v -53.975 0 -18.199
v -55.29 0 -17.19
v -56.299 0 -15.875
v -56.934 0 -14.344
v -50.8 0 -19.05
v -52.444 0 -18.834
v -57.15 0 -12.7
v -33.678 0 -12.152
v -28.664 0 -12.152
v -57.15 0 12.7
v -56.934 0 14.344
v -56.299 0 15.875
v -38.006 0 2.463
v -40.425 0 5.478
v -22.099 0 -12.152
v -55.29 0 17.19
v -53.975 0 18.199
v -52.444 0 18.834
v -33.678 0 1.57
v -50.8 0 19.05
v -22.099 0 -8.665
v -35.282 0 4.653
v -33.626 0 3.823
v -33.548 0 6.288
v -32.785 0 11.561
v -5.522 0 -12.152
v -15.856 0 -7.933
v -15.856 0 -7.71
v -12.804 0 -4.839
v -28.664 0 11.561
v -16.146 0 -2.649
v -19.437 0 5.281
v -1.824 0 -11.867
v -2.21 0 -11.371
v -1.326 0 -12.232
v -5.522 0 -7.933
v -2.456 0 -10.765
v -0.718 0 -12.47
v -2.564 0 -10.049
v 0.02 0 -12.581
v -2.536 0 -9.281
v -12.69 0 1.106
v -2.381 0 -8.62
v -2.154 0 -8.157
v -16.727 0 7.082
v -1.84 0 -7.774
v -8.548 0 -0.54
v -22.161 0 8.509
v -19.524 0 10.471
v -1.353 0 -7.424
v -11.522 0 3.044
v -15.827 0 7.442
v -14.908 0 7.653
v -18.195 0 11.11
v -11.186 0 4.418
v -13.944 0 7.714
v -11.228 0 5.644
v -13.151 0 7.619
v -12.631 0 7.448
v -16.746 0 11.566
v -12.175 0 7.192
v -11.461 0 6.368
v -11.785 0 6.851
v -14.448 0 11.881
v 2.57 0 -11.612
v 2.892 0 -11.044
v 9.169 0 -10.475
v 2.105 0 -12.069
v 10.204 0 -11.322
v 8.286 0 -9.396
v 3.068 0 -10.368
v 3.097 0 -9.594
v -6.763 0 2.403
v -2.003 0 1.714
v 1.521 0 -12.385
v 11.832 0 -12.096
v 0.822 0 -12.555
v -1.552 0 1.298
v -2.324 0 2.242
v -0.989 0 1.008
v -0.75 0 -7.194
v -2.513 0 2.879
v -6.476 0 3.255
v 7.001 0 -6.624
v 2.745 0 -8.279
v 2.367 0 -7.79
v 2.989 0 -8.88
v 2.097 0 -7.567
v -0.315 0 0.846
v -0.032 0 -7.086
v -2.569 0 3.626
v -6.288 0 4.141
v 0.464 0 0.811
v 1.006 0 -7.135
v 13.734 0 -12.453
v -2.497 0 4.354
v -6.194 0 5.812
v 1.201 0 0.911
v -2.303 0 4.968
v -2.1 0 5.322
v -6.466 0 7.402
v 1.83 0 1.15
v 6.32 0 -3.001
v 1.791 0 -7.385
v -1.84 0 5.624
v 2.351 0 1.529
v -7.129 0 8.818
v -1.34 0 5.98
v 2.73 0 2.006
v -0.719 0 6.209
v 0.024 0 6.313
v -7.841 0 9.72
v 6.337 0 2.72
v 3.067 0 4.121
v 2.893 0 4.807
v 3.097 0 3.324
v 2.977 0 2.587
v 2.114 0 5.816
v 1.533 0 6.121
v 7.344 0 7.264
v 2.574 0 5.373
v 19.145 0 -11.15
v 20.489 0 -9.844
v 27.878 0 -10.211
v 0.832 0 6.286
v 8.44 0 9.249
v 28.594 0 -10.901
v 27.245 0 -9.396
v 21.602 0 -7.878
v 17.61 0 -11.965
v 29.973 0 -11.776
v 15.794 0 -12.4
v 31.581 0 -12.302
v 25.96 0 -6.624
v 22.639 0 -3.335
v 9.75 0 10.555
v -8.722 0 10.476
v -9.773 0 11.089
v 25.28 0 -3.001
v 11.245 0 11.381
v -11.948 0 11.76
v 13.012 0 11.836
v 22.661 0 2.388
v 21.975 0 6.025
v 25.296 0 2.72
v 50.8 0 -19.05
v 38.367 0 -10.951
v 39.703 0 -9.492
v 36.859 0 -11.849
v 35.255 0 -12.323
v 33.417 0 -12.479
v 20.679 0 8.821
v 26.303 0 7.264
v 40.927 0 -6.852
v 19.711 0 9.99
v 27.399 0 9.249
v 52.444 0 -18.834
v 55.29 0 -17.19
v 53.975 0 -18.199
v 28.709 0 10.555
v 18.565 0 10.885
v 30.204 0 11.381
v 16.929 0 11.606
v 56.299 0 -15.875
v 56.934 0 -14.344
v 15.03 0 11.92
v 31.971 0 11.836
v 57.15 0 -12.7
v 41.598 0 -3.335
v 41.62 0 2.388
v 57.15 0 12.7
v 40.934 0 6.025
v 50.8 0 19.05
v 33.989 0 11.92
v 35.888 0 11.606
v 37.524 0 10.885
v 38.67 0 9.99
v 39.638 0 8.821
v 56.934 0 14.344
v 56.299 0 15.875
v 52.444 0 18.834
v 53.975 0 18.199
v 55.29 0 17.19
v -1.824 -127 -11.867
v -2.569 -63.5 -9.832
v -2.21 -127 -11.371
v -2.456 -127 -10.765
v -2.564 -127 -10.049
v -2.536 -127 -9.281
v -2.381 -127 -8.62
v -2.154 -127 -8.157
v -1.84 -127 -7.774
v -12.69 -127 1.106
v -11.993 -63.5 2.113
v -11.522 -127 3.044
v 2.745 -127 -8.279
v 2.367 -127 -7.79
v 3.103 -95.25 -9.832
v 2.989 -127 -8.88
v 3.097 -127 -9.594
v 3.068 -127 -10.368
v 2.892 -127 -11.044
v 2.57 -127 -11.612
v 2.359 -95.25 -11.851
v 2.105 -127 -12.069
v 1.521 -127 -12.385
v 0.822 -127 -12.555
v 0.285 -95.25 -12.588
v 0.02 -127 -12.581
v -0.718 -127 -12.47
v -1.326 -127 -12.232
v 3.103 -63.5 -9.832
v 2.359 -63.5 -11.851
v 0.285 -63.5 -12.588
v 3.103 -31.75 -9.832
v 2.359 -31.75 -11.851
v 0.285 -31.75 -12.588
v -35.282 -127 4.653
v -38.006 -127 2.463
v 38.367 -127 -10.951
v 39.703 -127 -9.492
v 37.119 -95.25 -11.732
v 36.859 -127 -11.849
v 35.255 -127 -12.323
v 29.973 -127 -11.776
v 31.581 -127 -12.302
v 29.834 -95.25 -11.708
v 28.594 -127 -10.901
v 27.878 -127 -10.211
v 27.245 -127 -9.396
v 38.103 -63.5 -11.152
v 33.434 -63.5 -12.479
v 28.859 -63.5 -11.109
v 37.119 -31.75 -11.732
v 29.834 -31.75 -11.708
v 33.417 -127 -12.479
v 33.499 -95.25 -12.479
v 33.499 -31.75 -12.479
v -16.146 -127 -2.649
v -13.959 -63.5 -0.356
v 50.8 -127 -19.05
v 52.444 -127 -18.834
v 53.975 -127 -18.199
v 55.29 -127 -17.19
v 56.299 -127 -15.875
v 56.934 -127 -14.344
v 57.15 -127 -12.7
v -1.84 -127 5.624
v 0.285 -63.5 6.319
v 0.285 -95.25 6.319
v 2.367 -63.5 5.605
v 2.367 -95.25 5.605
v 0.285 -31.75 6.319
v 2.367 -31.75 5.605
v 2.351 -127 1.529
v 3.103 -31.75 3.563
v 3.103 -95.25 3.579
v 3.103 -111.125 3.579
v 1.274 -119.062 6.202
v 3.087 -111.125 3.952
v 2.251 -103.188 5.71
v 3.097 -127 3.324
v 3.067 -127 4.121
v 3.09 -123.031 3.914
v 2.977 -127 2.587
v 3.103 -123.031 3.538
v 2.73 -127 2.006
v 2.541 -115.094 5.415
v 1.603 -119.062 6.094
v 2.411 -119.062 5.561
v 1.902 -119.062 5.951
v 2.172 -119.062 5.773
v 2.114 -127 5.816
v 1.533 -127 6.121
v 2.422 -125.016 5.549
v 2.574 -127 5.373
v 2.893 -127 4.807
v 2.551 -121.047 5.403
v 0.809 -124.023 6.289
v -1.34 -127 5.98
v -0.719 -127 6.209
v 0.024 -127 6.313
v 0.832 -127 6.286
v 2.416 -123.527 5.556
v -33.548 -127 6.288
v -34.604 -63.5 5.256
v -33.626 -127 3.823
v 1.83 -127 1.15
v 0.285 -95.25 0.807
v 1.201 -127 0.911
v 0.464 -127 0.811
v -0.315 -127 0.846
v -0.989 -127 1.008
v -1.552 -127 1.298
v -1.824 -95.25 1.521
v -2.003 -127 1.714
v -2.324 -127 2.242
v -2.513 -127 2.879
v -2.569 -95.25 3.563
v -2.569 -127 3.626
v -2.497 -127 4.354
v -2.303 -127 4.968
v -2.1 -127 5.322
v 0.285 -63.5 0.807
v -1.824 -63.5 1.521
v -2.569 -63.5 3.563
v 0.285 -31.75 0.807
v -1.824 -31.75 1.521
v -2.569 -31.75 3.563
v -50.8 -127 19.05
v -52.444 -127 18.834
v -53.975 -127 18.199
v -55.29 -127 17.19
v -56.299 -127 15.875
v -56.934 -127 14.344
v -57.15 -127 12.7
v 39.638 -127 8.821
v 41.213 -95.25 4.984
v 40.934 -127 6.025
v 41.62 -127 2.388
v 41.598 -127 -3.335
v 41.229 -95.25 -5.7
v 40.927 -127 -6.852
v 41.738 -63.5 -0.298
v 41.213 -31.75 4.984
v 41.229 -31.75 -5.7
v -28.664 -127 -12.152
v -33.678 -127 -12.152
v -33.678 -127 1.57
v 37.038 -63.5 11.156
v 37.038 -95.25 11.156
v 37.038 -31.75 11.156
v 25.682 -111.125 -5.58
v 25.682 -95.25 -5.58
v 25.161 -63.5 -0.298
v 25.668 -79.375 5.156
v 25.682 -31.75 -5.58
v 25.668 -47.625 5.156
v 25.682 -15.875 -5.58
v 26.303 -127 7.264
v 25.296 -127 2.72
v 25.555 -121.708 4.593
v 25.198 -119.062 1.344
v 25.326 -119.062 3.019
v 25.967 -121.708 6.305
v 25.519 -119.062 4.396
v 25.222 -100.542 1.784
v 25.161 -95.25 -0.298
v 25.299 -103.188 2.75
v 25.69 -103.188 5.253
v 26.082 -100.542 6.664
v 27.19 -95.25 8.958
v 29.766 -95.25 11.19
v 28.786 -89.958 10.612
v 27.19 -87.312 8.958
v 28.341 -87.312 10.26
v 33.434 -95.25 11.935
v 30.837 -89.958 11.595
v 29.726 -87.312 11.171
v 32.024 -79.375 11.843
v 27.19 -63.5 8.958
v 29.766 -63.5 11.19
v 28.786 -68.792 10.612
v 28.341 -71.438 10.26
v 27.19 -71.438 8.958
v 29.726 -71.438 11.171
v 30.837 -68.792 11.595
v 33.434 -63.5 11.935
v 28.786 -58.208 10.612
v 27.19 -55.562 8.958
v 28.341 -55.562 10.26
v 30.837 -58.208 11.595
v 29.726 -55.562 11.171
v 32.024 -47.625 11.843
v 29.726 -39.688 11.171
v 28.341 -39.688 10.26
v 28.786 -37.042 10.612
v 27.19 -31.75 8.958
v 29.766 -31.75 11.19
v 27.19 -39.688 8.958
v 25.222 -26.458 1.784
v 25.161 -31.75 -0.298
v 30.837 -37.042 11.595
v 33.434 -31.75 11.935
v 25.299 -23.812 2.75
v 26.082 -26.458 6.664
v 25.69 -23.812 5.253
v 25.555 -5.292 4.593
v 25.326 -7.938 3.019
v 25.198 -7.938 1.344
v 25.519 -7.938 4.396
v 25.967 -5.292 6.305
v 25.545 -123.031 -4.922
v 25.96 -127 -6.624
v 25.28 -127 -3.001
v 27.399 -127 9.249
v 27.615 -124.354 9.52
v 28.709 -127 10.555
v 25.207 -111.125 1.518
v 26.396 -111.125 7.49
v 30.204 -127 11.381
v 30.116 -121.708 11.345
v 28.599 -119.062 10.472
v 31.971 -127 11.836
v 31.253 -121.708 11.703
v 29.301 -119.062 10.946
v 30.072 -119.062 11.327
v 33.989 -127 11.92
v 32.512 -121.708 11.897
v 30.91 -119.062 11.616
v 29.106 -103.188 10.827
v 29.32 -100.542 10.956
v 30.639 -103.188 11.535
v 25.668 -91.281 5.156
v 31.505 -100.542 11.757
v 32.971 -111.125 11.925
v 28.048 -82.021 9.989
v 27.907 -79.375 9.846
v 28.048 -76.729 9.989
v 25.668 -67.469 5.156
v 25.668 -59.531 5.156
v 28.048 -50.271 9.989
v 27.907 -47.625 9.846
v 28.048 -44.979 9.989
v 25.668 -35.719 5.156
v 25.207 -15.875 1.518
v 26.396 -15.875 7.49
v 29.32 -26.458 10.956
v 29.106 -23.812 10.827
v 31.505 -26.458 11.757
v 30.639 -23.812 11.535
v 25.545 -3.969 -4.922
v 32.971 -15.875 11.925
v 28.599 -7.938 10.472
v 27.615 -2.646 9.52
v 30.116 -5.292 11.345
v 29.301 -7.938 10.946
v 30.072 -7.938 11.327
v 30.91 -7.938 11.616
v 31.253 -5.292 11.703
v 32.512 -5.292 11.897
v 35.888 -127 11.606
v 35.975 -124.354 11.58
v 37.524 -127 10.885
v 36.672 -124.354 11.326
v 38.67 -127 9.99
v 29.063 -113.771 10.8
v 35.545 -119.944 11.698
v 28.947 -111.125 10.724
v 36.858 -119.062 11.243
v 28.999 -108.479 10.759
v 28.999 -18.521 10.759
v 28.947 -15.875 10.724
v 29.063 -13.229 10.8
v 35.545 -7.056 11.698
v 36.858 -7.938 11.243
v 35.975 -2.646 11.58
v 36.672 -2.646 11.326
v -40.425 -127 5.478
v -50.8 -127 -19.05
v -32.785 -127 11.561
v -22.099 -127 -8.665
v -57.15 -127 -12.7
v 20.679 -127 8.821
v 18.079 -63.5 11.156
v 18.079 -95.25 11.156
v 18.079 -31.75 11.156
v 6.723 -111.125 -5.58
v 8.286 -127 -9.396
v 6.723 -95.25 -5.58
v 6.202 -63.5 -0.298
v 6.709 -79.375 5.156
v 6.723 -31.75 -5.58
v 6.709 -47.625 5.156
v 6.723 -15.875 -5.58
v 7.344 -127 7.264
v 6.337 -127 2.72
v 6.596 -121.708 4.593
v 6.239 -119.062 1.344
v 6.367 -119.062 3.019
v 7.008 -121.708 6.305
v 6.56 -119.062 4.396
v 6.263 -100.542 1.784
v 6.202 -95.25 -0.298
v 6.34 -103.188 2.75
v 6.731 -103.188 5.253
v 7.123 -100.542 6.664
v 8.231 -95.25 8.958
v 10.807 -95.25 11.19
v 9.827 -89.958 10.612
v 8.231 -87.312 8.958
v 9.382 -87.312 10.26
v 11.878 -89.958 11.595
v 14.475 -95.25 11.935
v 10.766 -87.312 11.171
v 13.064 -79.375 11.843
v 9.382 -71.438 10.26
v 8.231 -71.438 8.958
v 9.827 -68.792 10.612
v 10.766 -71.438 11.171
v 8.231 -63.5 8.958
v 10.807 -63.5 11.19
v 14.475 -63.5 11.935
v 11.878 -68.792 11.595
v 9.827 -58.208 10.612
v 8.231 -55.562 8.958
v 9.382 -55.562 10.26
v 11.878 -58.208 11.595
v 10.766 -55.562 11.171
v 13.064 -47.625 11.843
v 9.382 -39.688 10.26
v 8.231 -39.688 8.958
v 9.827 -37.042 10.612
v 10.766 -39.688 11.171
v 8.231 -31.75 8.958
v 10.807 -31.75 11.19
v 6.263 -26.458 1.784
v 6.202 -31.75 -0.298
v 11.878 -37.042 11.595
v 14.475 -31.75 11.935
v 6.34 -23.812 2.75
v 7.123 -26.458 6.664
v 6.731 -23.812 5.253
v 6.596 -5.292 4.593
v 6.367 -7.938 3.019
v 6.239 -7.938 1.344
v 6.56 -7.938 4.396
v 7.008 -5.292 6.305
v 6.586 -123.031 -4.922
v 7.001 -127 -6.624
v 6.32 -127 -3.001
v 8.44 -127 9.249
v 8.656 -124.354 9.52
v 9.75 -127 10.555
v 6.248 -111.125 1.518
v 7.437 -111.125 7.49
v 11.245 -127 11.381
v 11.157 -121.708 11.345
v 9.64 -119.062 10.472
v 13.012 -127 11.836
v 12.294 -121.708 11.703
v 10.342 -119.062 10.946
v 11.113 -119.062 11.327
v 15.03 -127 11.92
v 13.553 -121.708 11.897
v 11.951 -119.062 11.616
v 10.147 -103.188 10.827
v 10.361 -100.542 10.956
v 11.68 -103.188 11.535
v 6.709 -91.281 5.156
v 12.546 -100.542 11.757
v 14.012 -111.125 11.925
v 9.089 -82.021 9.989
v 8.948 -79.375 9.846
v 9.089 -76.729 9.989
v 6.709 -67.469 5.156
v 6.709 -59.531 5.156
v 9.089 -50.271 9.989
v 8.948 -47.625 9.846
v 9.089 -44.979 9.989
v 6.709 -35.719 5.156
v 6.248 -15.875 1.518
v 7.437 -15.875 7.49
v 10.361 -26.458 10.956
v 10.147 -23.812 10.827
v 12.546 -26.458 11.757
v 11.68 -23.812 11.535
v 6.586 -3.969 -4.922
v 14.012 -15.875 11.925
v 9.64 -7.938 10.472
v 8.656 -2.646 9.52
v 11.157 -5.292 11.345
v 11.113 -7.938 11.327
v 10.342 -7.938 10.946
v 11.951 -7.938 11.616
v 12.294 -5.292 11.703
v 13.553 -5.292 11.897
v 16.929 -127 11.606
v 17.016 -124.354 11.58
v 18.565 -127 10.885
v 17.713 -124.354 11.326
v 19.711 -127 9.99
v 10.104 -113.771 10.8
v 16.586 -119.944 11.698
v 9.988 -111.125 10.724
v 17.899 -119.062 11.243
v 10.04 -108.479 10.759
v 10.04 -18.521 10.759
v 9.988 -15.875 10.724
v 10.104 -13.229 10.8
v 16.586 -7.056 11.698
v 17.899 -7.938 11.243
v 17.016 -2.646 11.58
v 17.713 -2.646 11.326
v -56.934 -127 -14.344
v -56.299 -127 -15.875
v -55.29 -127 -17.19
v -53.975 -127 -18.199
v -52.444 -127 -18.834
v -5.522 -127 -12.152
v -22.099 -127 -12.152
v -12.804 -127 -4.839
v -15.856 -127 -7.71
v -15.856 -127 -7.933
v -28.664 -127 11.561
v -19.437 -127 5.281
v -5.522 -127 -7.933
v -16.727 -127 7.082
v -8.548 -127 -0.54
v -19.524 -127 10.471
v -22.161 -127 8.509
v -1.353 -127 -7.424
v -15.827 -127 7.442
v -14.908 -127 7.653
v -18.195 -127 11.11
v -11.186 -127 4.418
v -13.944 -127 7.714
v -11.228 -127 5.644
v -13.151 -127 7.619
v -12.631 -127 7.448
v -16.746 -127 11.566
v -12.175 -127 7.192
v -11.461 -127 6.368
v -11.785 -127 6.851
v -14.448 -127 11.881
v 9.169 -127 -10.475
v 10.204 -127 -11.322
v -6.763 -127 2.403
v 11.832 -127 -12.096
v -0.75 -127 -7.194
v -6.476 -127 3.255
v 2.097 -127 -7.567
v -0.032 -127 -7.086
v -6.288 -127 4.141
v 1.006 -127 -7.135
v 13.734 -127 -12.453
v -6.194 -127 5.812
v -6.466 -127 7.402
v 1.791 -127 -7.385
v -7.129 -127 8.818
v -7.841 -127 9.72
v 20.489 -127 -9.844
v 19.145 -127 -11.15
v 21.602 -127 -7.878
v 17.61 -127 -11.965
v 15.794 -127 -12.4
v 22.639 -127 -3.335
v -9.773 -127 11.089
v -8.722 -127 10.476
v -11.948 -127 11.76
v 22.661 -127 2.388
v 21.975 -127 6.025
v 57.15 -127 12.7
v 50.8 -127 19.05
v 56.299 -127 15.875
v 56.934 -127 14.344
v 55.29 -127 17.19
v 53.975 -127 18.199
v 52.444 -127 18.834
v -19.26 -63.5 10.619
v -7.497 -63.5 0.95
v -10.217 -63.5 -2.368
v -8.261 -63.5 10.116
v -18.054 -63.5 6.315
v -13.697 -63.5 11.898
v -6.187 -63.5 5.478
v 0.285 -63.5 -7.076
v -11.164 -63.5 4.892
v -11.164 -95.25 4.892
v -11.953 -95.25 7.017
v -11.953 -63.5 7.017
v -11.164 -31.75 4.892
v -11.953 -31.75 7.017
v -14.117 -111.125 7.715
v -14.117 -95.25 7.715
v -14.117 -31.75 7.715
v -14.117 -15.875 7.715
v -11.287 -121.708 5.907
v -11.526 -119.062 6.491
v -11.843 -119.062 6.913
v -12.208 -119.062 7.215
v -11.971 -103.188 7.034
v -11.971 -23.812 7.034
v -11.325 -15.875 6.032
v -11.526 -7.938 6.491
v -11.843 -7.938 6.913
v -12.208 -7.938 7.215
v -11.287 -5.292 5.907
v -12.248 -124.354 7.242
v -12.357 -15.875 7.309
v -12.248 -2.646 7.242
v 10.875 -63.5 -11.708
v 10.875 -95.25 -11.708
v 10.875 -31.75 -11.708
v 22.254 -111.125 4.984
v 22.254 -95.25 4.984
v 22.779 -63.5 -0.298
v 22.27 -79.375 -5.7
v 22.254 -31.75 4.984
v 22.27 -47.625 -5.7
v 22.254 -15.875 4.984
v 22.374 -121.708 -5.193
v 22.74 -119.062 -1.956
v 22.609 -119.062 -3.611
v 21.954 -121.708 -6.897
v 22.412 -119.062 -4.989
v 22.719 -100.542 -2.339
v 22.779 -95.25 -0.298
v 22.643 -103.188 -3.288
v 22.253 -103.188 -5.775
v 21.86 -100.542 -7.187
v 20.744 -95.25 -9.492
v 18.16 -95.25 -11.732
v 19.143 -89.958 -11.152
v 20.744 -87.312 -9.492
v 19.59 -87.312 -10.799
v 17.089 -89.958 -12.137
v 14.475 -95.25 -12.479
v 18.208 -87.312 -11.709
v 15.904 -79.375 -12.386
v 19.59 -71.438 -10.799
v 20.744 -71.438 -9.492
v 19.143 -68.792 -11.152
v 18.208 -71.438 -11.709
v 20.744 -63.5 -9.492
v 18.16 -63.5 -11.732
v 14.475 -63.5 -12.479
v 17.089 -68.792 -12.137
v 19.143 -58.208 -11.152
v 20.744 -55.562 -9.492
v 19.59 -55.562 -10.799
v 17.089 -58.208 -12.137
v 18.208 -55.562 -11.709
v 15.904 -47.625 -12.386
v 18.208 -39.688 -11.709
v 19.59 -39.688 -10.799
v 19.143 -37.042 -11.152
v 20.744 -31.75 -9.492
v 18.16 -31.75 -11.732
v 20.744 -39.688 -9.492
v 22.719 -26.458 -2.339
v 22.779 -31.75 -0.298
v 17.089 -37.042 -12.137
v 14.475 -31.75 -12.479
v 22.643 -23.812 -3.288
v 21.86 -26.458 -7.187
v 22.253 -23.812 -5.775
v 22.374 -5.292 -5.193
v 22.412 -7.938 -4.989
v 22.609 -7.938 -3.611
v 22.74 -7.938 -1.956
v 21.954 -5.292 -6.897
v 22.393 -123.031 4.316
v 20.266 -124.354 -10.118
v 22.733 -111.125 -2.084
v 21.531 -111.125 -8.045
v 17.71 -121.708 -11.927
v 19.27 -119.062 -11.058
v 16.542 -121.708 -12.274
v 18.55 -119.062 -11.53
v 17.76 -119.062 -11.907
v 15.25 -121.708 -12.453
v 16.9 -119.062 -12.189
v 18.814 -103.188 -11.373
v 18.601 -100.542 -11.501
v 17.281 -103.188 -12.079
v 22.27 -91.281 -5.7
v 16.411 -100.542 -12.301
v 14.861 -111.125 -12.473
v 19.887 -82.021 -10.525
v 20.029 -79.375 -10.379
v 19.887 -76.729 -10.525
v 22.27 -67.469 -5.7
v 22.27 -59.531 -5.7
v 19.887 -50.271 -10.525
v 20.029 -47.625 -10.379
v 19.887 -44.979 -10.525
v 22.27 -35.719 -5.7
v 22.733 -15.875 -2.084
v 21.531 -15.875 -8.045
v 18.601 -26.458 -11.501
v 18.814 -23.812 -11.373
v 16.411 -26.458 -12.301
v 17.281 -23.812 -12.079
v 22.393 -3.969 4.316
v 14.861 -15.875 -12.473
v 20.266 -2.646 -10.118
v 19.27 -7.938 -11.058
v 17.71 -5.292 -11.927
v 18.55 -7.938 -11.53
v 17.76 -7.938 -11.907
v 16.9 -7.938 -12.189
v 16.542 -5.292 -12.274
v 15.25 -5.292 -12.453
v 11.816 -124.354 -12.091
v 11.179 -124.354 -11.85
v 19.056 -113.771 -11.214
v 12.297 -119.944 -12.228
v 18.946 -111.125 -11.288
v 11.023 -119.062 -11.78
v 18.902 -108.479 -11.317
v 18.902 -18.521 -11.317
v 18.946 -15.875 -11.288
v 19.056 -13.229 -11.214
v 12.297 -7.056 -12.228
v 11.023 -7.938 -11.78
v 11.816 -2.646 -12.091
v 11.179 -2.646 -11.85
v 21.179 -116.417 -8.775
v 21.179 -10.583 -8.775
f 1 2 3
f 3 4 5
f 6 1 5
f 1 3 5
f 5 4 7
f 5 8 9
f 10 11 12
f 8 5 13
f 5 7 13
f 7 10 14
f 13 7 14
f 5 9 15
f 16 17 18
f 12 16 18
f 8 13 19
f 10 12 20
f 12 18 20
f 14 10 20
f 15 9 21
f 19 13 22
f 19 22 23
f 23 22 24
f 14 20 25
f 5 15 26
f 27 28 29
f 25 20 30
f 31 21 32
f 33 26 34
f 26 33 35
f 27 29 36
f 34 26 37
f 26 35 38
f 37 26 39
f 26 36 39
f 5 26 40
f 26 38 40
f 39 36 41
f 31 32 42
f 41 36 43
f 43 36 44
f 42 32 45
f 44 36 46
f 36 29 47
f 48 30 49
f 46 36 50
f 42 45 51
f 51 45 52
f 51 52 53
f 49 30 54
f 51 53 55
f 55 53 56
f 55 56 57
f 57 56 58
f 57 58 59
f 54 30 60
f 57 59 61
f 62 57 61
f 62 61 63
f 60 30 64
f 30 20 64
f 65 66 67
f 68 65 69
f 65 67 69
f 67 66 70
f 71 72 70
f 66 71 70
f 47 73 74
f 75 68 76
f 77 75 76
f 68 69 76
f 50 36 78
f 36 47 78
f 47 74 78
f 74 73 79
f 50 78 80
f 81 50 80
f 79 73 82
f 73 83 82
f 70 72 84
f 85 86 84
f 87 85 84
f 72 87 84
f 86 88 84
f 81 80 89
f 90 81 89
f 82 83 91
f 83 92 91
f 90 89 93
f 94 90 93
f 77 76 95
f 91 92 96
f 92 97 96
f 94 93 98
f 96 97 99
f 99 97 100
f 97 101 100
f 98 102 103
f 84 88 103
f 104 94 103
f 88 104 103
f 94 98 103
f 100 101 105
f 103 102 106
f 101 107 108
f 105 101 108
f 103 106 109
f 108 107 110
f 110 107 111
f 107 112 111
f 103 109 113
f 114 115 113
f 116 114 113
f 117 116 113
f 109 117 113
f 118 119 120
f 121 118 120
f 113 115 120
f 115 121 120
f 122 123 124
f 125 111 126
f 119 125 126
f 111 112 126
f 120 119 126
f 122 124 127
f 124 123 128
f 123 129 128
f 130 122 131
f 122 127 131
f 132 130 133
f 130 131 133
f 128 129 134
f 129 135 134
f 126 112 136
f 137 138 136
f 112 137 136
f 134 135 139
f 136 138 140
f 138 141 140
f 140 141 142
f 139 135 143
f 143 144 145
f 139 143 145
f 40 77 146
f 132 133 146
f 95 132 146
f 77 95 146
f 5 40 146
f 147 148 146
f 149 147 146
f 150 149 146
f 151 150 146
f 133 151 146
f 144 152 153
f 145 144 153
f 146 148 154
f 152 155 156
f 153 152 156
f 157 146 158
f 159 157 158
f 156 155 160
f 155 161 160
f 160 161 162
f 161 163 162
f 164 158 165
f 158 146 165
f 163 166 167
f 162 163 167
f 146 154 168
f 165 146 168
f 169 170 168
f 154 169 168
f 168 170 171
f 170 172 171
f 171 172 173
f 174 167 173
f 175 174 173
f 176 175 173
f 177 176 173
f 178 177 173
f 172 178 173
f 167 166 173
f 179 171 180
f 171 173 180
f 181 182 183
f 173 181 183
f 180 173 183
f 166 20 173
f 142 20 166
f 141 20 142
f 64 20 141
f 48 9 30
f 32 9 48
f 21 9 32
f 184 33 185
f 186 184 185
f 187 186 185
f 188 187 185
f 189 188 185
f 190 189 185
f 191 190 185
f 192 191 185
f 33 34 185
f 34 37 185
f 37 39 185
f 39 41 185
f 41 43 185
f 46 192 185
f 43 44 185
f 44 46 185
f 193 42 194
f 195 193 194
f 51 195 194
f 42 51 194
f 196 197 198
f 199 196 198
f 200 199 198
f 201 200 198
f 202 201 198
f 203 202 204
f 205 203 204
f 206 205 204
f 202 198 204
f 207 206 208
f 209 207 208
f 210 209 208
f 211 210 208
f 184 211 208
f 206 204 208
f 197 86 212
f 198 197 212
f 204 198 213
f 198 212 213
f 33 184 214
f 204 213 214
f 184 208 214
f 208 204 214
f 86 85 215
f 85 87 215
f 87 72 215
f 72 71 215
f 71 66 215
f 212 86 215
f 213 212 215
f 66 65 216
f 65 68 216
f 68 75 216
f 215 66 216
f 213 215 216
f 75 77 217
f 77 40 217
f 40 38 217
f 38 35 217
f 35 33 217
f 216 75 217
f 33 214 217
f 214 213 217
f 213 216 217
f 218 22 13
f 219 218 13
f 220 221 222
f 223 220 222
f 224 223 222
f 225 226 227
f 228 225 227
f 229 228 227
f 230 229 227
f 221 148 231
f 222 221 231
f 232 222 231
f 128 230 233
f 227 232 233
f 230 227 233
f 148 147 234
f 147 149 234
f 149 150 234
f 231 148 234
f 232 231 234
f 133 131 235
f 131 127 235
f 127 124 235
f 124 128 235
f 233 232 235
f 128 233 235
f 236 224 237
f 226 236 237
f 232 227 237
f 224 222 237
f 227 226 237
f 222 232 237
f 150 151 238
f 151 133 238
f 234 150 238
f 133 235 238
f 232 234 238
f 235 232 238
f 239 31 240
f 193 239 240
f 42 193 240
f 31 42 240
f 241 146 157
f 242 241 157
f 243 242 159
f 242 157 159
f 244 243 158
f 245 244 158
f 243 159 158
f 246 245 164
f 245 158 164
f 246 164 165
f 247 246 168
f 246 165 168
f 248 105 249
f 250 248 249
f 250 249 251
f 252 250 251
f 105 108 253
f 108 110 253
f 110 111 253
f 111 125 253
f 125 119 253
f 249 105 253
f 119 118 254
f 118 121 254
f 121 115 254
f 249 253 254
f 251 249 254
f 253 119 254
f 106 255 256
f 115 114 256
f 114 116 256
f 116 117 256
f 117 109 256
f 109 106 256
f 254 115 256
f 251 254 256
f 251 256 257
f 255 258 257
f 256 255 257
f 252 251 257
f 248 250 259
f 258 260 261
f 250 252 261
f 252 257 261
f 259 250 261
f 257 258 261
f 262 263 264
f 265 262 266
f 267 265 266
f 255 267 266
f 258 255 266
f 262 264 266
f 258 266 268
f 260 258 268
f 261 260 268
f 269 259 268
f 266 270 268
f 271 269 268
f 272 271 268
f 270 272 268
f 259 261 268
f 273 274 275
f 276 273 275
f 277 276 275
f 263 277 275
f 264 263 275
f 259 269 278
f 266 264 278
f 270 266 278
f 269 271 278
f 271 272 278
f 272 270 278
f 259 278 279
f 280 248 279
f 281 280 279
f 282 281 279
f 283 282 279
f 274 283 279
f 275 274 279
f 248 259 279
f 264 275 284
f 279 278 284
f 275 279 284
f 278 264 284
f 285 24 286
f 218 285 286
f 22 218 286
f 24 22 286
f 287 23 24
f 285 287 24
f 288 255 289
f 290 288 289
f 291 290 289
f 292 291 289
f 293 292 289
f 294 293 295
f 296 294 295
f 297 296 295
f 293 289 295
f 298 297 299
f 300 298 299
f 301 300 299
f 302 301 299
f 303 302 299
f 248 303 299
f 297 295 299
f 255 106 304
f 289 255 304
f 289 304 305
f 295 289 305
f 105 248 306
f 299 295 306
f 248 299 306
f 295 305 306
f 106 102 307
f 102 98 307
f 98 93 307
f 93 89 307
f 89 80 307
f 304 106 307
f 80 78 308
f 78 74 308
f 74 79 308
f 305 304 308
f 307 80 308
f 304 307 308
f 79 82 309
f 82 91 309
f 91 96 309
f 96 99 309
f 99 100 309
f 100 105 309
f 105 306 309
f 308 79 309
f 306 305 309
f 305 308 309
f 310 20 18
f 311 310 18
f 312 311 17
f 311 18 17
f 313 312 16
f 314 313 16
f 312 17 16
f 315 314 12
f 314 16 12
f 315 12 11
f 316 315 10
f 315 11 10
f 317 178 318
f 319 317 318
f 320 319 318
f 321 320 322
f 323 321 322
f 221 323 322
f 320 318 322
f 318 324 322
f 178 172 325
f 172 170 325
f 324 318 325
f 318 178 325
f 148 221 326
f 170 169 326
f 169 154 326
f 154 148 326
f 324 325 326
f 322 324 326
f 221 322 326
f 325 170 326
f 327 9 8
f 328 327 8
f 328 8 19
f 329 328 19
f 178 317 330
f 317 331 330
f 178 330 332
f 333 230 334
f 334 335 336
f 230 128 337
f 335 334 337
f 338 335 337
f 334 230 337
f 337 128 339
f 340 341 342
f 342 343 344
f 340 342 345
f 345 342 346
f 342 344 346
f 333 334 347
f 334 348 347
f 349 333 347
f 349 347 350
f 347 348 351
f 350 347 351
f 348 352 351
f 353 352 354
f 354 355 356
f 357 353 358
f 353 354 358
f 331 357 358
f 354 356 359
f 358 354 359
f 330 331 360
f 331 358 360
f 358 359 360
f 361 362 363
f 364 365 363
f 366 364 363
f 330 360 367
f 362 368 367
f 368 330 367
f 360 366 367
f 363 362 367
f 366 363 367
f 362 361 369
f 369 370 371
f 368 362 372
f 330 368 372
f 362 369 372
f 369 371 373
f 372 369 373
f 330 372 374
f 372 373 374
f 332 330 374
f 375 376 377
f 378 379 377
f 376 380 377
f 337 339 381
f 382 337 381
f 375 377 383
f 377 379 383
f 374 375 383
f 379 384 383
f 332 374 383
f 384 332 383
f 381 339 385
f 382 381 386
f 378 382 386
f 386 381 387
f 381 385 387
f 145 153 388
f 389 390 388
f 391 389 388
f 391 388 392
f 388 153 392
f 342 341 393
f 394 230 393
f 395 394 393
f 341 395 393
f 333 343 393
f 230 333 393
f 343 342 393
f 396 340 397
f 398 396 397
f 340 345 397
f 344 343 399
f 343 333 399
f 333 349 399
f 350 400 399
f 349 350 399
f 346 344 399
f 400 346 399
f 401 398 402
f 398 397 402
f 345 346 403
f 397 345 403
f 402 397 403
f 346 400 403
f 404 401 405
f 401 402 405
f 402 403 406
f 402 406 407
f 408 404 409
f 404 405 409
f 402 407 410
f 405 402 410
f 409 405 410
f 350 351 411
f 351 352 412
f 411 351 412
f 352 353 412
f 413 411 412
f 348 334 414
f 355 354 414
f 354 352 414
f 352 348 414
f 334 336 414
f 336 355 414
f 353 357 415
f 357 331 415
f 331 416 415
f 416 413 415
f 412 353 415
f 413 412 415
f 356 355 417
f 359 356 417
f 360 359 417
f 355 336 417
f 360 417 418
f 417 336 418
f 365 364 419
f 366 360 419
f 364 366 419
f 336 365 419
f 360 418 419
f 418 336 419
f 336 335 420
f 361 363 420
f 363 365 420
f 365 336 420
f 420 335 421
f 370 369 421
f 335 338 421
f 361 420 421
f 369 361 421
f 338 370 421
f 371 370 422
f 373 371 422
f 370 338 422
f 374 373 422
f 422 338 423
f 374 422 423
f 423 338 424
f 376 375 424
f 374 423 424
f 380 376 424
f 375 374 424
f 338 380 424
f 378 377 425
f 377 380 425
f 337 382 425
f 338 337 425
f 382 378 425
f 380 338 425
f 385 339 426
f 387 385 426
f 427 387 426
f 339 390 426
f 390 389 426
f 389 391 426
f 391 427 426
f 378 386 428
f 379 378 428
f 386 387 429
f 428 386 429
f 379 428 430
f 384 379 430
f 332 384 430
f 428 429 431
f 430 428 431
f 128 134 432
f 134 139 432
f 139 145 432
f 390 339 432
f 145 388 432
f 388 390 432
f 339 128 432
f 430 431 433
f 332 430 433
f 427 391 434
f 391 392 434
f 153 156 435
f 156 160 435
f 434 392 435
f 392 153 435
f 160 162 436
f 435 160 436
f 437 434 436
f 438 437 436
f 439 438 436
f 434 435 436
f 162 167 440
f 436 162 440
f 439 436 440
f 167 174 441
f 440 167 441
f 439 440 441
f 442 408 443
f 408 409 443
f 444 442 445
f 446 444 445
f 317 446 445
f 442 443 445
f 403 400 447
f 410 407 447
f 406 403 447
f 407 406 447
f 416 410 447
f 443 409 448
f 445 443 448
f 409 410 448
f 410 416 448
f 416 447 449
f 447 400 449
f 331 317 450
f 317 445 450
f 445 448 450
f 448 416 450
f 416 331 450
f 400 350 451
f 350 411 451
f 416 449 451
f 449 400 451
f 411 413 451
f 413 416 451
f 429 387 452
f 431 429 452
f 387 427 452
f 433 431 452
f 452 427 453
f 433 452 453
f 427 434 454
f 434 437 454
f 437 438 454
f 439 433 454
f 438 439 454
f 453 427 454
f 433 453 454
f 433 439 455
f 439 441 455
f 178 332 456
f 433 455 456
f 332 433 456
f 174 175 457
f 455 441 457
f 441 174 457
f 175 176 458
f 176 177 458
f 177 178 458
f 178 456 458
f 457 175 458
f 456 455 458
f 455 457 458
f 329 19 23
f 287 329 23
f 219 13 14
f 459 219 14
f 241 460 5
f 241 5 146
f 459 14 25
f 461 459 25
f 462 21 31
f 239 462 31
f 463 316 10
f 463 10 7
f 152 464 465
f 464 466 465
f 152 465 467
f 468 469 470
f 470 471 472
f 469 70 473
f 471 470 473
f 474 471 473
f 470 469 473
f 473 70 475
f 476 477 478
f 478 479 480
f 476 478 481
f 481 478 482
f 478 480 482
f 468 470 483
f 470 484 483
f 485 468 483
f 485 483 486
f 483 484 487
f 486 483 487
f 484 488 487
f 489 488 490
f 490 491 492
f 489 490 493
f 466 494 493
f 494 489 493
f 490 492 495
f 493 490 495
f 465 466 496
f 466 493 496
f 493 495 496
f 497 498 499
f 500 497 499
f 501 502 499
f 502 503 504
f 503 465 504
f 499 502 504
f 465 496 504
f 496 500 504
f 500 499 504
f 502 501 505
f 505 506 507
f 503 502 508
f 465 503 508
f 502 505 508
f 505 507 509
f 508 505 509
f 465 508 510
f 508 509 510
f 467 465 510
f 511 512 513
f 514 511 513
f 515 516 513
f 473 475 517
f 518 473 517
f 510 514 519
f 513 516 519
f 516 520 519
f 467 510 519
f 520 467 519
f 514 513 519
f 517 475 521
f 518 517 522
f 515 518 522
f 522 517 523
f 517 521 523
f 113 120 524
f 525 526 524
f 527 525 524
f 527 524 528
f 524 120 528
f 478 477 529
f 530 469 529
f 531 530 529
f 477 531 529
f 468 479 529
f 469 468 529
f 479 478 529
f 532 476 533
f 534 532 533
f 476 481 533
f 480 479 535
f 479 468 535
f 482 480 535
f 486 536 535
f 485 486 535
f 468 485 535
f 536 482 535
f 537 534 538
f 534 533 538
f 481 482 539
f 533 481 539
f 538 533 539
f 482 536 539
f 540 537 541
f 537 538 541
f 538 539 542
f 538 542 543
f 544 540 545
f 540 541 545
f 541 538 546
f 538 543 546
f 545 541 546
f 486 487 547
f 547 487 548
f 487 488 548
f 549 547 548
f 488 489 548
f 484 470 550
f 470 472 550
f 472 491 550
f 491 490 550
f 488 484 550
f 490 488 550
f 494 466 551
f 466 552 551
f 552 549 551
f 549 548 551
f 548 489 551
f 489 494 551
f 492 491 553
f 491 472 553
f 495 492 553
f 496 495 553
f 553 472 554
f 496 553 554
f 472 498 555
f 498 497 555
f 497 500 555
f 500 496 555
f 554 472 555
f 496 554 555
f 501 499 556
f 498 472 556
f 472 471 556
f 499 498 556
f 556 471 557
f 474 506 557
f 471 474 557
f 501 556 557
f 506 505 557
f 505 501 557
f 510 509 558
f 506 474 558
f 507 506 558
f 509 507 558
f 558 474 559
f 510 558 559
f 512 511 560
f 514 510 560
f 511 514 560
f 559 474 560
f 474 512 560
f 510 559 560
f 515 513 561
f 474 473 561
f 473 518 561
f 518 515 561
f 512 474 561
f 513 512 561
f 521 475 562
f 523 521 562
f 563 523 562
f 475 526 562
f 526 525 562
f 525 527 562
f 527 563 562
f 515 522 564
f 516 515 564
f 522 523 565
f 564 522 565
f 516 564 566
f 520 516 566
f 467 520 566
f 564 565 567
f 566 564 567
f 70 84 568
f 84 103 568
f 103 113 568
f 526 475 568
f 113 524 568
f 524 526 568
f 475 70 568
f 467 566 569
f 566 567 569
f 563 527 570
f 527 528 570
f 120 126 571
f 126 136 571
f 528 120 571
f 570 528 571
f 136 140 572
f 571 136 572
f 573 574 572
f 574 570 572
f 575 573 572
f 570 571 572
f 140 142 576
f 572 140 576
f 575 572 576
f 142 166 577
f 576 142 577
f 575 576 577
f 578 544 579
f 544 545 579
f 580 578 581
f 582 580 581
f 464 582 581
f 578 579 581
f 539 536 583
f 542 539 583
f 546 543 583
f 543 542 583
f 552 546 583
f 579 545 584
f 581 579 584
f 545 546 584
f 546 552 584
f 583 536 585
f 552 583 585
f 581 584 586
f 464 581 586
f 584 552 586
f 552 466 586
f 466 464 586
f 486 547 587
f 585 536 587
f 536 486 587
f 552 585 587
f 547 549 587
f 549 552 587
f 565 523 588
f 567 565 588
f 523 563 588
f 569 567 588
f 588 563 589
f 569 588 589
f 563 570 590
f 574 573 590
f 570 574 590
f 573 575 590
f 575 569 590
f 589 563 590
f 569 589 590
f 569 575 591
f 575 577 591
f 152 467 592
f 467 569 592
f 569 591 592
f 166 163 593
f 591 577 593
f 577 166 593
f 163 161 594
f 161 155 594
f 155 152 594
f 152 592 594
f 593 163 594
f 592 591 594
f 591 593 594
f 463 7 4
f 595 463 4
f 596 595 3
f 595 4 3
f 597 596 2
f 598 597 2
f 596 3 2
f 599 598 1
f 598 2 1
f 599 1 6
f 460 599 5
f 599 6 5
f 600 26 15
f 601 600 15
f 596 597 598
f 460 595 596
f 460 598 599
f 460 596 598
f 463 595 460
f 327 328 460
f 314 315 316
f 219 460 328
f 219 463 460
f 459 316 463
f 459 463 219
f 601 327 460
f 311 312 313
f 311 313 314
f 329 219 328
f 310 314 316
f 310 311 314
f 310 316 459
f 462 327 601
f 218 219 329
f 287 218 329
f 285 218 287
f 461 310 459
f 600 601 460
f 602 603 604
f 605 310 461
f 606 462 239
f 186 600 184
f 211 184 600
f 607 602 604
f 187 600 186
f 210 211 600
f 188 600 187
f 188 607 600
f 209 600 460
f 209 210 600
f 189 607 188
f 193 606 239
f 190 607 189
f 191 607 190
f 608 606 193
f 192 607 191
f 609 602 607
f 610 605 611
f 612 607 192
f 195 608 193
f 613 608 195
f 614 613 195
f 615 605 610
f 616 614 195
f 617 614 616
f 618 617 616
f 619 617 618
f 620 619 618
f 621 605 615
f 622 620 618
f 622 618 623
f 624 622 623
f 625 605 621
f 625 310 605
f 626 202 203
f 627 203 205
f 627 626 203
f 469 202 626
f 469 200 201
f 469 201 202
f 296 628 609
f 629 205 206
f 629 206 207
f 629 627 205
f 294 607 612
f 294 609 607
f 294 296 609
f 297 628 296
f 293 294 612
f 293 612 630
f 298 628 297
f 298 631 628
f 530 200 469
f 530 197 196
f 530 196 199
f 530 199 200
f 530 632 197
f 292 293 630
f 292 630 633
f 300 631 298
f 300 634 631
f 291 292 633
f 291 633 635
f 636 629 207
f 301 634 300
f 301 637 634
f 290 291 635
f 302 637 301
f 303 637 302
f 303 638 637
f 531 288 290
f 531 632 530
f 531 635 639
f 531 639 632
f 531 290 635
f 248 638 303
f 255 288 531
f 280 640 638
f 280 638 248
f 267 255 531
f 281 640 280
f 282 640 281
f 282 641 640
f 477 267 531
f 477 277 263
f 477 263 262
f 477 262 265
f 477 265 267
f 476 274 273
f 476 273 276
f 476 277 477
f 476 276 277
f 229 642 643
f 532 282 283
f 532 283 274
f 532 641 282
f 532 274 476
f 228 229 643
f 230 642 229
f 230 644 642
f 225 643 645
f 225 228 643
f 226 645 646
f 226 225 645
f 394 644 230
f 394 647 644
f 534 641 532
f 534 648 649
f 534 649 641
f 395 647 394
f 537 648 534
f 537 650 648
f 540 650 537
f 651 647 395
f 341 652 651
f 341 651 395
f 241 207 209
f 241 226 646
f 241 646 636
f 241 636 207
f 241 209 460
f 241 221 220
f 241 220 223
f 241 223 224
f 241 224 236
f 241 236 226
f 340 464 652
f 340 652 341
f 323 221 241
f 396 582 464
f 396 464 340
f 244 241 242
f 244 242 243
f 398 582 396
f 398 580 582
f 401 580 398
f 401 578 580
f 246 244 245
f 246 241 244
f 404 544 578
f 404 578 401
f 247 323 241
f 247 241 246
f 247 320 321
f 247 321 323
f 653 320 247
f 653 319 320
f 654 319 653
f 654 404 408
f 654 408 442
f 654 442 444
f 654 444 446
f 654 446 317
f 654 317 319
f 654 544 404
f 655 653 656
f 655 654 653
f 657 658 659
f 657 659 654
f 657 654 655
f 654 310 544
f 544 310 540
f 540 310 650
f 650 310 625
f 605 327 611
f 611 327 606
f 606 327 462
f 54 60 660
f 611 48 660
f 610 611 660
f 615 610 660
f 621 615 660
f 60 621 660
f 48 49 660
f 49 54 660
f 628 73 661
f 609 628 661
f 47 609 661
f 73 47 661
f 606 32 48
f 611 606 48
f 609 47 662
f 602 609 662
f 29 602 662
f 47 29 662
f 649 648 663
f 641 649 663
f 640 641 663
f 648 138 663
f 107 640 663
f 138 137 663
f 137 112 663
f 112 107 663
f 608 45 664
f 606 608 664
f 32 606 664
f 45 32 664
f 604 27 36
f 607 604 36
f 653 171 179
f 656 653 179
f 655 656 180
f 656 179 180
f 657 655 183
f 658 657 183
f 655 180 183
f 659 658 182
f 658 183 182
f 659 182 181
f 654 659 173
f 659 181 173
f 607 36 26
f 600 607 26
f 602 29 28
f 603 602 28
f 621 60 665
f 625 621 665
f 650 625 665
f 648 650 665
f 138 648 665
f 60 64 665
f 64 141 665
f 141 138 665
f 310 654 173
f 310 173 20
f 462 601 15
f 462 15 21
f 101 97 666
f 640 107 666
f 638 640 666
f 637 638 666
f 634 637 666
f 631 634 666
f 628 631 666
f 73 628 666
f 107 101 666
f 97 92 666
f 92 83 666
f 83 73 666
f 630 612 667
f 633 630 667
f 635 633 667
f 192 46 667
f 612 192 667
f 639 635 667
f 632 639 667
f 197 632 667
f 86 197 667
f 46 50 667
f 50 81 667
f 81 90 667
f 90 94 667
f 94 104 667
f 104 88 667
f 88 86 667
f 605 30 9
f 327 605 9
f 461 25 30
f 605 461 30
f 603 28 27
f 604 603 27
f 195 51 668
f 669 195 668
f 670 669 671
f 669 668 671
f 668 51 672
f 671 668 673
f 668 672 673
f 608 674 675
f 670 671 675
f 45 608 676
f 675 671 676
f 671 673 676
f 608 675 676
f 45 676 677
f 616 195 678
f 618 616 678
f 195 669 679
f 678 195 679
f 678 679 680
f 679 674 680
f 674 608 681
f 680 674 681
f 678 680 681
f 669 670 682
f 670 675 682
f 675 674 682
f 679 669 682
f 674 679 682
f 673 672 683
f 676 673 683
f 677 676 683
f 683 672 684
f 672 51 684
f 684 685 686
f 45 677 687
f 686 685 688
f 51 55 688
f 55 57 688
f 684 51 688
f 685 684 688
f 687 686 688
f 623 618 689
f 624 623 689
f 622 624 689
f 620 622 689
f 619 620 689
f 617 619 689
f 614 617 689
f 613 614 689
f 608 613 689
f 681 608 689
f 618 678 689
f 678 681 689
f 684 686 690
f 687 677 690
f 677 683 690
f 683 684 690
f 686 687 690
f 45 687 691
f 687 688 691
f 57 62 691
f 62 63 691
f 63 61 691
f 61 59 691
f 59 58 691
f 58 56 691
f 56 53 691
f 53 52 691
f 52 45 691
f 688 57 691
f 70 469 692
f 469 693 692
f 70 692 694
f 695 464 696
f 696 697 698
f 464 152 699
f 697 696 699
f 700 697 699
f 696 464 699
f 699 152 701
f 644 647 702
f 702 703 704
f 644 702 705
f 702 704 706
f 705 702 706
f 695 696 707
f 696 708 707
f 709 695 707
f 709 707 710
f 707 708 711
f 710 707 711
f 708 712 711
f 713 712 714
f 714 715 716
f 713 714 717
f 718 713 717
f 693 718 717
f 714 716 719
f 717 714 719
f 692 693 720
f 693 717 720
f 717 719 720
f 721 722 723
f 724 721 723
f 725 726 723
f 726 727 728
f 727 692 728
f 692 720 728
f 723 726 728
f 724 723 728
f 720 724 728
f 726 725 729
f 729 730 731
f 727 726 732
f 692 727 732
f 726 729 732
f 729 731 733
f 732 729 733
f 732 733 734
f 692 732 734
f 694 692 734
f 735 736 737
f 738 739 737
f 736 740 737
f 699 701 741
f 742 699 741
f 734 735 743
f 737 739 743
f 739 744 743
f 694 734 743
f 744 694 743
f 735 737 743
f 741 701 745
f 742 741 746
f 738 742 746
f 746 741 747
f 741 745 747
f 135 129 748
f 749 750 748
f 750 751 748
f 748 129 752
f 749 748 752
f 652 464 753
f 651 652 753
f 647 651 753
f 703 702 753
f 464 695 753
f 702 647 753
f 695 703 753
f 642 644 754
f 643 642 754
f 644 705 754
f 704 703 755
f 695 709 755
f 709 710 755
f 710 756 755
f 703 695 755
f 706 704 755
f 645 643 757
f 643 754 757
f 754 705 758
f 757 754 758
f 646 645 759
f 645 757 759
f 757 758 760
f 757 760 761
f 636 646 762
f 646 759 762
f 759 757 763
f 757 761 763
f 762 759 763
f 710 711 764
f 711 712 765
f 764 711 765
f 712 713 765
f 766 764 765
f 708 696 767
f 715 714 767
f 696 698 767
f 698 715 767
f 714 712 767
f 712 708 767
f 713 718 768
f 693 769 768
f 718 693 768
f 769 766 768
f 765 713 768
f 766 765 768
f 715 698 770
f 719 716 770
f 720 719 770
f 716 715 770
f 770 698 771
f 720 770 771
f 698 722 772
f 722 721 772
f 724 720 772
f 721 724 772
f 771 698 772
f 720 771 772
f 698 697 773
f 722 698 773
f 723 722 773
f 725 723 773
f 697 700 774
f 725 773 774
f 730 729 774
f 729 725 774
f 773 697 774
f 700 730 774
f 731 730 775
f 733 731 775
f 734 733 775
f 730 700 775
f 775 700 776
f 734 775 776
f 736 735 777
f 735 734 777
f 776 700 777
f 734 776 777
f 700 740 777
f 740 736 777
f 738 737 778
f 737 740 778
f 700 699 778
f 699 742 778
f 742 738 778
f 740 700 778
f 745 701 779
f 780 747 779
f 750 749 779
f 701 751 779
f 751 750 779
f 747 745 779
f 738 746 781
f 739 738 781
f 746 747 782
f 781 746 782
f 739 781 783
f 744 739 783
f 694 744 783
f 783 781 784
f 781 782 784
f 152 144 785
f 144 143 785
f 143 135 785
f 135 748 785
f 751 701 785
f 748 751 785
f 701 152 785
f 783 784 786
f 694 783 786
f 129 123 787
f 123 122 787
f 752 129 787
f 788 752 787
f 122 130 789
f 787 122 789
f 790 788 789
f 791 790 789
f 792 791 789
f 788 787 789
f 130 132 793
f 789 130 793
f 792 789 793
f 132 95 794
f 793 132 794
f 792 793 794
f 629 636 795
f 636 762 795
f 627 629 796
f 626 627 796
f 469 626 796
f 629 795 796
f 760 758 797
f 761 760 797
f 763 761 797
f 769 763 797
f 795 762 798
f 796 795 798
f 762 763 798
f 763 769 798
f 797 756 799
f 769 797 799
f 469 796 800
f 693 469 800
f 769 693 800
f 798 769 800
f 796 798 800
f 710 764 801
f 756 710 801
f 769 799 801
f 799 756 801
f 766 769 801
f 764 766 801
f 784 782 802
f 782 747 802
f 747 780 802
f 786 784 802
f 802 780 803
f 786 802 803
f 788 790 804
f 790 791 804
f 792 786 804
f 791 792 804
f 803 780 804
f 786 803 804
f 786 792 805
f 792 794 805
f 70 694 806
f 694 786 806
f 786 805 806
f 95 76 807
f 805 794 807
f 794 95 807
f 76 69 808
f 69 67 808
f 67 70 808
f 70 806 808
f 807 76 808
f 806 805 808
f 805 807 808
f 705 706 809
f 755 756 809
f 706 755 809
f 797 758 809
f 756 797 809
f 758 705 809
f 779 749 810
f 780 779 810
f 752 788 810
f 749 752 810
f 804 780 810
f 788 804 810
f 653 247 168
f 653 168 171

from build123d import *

# Parameters (mm, degrees)
F1_DEPTH = 127


with BuildPart() as f1:
    # F0 (on Front) → F1 (new body)
    with BuildSketch(Plane.XZ):
        with BuildLine():
            ThreePointArc((57.15, 12.7), (55.2901280605, 17.1901280605), (50.8, 19.05))
            Line((50.8, 19.05), (-50.8, 19.05))
            ThreePointArc((-50.8, 19.05), (-55.2901280605, 17.1901280605), (-57.15, 12.7))
            Line((-57.15, 12.7), (-57.15, -12.7))
            ThreePointArc((-57.15, -12.7), (-55.2901280605, -17.1901280605), (-50.8, -19.05))
            Line((-50.8, -19.05), (50.8, -19.05))
            ThreePointArc((50.8, -19.05), (55.2901280605, -17.1901280605), (57.15, -12.7))
            Line((57.15, -12.7), (57.15, 12.7))
        make_face()
        with BuildLine():
            Line((-28.6644783725, 11.5609067216), (-28.6644783725, -12.1521865949))
            Line((-28.6644783725, -12.1521865949), (-33.6780148452, -12.1521865949))
            Line((-33.6780148452, -12.1521865949), (-33.6780148452, 1.5701637506))
            Line((-33.6780148452, 1.5701637506), (-33.6261148817, 3.8226221659))
            Line((-33.6261148817, 3.8226221659), (-33.5482649364, 6.2878704315))
            add(Edge.make_bspline(
                [(-33.5482649364, 6.2878704315), (-34.7938640601, 5.0422713078), (-35.2817237169, 4.6530215817)],
                knots=[0, 0, 0, 1, 1, 1], degree=2))
            Line((-35.2817237169, 4.6530215817), (-38.0064717998, 2.4628431226))
            Line((-38.0064717998, 2.4628431226), (-40.4250100983, 5.4782310011))
            Line((-40.4250100983, 5.4782310011), (-32.7853354732, 11.5609067216))
            Line((-32.7853354732, 11.5609067216), (-28.6644783725, 11.5609067216))
        make_face(mode=Mode.SUBTRACT)
        with BuildLine():
            Line((-5.5222846543, -7.9327195635), (-5.5222846543, -12.1521865949))
            Line((-5.5222846543, -12.1521865949), (-22.0991329916, -12.1521865949))
            Line((-22.0991329916, -12.1521865949), (-22.0991329916, -8.6645090487))
            Line((-22.0991329916, -8.6645090487), (-16.1462071798, -2.6493032807))
            add(Edge.make_bspline(
                [(-16.1462071798, -2.6493032807), (-13.499309042, 0.0598748132), (-12.6896696117, 1.1056590774)],
                knots=[0, 0, 0, 1, 1, 1], degree=2))
            add(Edge.make_bspline(
                [(-12.6896696117, 1.1056590774), (-11.8800301813, 2.1514433417), (-11.5219204332, 3.0441227136)],
                knots=[0, 0, 0, 1, 1, 1], degree=2))
            add(Edge.make_bspline(
                [(-11.5219204332, 3.0441227136), (-11.1638106852, 3.9368020856), (-11.1638106852, 4.8917614137)],
                knots=[0, 0, 0, 1, 1, 1], degree=2))
            add(Edge.make_bspline(
                [(-11.1638106852, 4.8917614137), (-11.1638106852, 6.3190104095), (-11.9526901302, 7.0170649184)],
                knots=[0, 0, 0, 1, 1, 1], degree=2))
            add(Edge.make_bspline(
                [(-11.9526901302, 7.0170649184), (-12.7415695752, 7.7151194273), (-14.0546386513, 7.7151194273)],
                knots=[0, 0, 0, 1, 1, 1], degree=2))
            add(Edge.make_bspline(
                [(-14.0546386513, 7.7151194273), (-15.4299876837, 7.7151194273), (-16.7274867708, 7.0819398728)],
                knots=[0, 0, 0, 1, 1, 1], degree=2))
            add(Edge.make_bspline(
                [(-16.7274867708, 7.0819398728), (-18.024985858, 6.4487603183), (-19.4366648648, 5.2810111398)],
                knots=[0, 0, 0, 1, 1, 1], degree=2))
            Line((-19.4366648648, 5.2810111398), (-22.1614129478, 8.5091888686))
            add(Edge.make_bspline(
                [(-22.1614129478, 8.5091888686), (-20.4123841783, 10.003907817), (-19.2602049889, 10.6189223843)],
                knots=[0, 0, 0, 1, 1, 1], degree=2))
            add(Edge.make_bspline(
                [(-19.2602049889, 10.6189223843), (-18.1080257995, 11.2339369516), (-16.7456517581, 11.5660967179)],
                knots=[0, 0, 0, 1, 1, 1], degree=2))
            add(Edge.make_bspline(
                [(-16.7456517581, 11.5660967179), (-15.3832777166, 11.8982564842), (-13.6965289033, 11.8982564842)],
                knots=[0, 0, 0, 1, 1, 1], degree=2))
            add(Edge.make_bspline(
                [(-13.6965289033, 11.8982564842), (-11.4752104661, 11.8982564842), (-9.7728916638, 11.0886170539)],
                knots=[0, 0, 0, 1, 1, 1], degree=2))
            add(Edge.make_bspline(
                [(-9.7728916638, 11.0886170539), (-8.0705728615, 10.2789776235), (-7.1285885242, 8.8179936514)],
                knots=[0, 0, 0, 1, 1, 1], degree=2))
            add(Edge.make_bspline(
                [(-7.1285885242, 8.8179936514), (-6.186604187, 7.3570096793), (-6.186604187, 5.4782310011)],
                knots=[0, 0, 0, 1, 1, 1], degree=2))
            add(Edge.make_bspline(
                [(-6.186604187, 5.4782310011), (-6.186604187, 3.8381921549), (-6.7626937816, 2.4031581646)],
                knots=[0, 0, 0, 1, 1, 1], degree=2))
            add(Edge.make_bspline(
                [(-6.7626937816, 2.4031581646), (-7.3387833763, 0.9681241742), (-8.5480525255, -0.539569765)],
                knots=[0, 0, 0, 1, 1, 1], degree=2))
            add(Edge.make_bspline(
                [(-8.5480525255, -0.539569765), (-9.7573216747, -2.0472637043), (-12.8038495313, -4.8394817398)],
                knots=[0, 0, 0, 1, 1, 1], degree=2))
            Line((-12.8038495313, -4.8394817398), (-15.8555673843, -7.7095497206))
            Line((-15.8555673843, -7.7095497206), (-15.8555673843, -7.9327195635))
            Line((-15.8555673843, -7.9327195635), (-5.5222846543, -7.9327195635))
        make_face(mode=Mode.SUBTRACT)
        with BuildLine():
            add(Edge.make_bspline(
                [(-1.824412256, -11.8667367957), (-2.569176732, -11.1453273033), (-2.569176732, -9.8322582271)],
                knots=[0, 0, 0, 1, 1, 1], degree=2))
            add(Edge.make_bspline(
                [(-2.569176732, -9.8322582271), (-2.569176732, -8.4724791838), (-1.839982245, -7.7744246749)],
                knots=[0, 0, 0, 1, 1, 1], degree=2))
            add(Edge.make_bspline(
                [(-1.839982245, -7.7744246749), (-1.1107877581, -7.076370166), (0.2853212597, -7.076370166)],
                knots=[0, 0, 0, 1, 1, 1], degree=2))
            add(Edge.make_bspline(
                [(0.2853212597, -7.076370166), (1.6295303139, -7.076370166), (2.3665097954, -7.789994664)],
                knots=[0, 0, 0, 1, 1, 1], degree=2))
            add(Edge.make_bspline(
                [(2.3665097954, -7.789994664), (3.1034892769, -8.5036191619), (3.1034892769, -9.8322582271)],
                knots=[0, 0, 0, 1, 1, 1], degree=2))
            add(Edge.make_bspline(
                [(3.1034892769, -9.8322582271), (3.1034892769, -11.1141873252), (2.3587248009, -11.8511668067)],
                knots=[0, 0, 0, 1, 1, 1], degree=2))
            add(Edge.make_bspline(
                [(2.3587248009, -11.8511668067), (1.6139603249, -12.5881462882), (0.2853212597, -12.5881462882)],
                knots=[0, 0, 0, 1, 1, 1], degree=2))
            add(Edge.make_bspline(
                [(0.2853212597, -12.5881462882), (-1.07964778, -12.5881462882), (-1.824412256, -11.8667367957)],
                knots=[0, 0, 0, 1, 1, 1], degree=2))
        make_face(mode=Mode.SUBTRACT)
        with BuildLine():
            add(Edge.make_bspline(
                [(20.6794119113, 8.8205886495), (22.7787654342, 5.7065908404), (22.7787654342, -0.2982349348)],
                knots=[0, 0, 0, 1, 1, 1], degree=2))
            add(Edge.make_bspline(
                [(22.7787654342, -0.2982349348), (22.7787654342, -6.5054705677), (20.7442868656, -9.4923134663)],
                knots=[0, 0, 0, 1, 1, 1], degree=2))
            add(Edge.make_bspline(
                [(20.7442868656, -9.4923134663), (18.709808297, -12.4791563649), (14.4747712766, -12.4791563649)],
                knots=[0, 0, 0, 1, 1, 1], degree=2))
            add(Edge.make_bspline(
                [(14.4747712766, -12.4791563649), (10.3694841649, -12.4791563649), (8.2857006309, -9.3962985338)],
                knots=[0, 0, 0, 1, 1, 1], degree=2))
            add(Edge.make_bspline(
                [(8.2857006309, -9.3962985338), (6.201917097, -6.3134407028), (6.201917097, -0.2982349348)],
                knots=[0, 0, 0, 1, 1, 1], degree=2))
            add(Edge.make_bspline(
                [(6.201917097, -0.2982349348), (6.201917097, 5.9816606469), (8.2312056693, 8.9581235528)],
                knots=[0, 0, 0, 1, 1, 1], degree=2))
            add(Edge.make_bspline(
                [(8.2312056693, 8.9581235528), (10.2604942416, 11.9345864587), (14.4747712766, 11.9345864587)],
                knots=[0, 0, 0, 1, 1, 1], degree=2))
            add(Edge.make_bspline(
                [(14.4747712766, 11.9345864587), (18.5800583883, 11.9345864587), (20.6794119113, 8.8205886495)],
                knots=[0, 0, 0, 1, 1, 1], degree=2))
        make_face(mode=Mode.SUBTRACT)
        with BuildLine():
            add(Edge.make_bspline(
                [(39.6384685725, 8.8205886495), (41.7378220955, 5.7065908404), (41.7378220955, -0.2982349348)],
                knots=[0, 0, 0, 1, 1, 1], degree=2))
            add(Edge.make_bspline(
                [(41.7378220955, -0.2982349348), (41.7378220955, -6.5054705677), (39.7033435268, -9.4923134663)],
                knots=[0, 0, 0, 1, 1, 1], degree=2))
            add(Edge.make_bspline(
                [(39.7033435268, -9.4923134663), (37.6688649582, -12.4791563649), (33.4338279378, -12.4791563649)],
                knots=[0, 0, 0, 1, 1, 1], degree=2))
            add(Edge.make_bspline(
                [(33.4338279378, -12.4791563649), (29.3285408261, -12.4791563649), (27.2447572922, -9.3962985338)],
                knots=[0, 0, 0, 1, 1, 1], degree=2))
            add(Edge.make_bspline(
                [(27.2447572922, -9.3962985338), (25.1609737582, -6.3134407028), (25.1609737582, -0.2982349348)],
                knots=[0, 0, 0, 1, 1, 1], degree=2))
            add(Edge.make_bspline(
                [(25.1609737582, -0.2982349348), (25.1609737582, 5.9816606469), (27.1902623305, 8.9581235528)],
                knots=[0, 0, 0, 1, 1, 1], degree=2))
            add(Edge.make_bspline(
                [(27.1902623305, 8.9581235528), (29.2195509028, 11.9345864587), (33.4338279378, 11.9345864587)],
                knots=[0, 0, 0, 1, 1, 1], degree=2))
            add(Edge.make_bspline(
                [(33.4338279378, 11.9345864587), (37.5391150495, 11.9345864587), (39.6384685725, 8.8205886495)],
                knots=[0, 0, 0, 1, 1, 1], degree=2))
        make_face(mode=Mode.SUBTRACT)
        with BuildLine():
            add(Edge.make_bspline(
                [(-1.824412256, 1.5208587853), (-2.569176732, 2.2344832832), (-2.569176732, 3.5631223485)],
                knots=[0, 0, 0, 1, 1, 1], degree=2))
            add(Edge.make_bspline(
                [(-2.569176732, 3.5631223485), (-2.569176732, 4.9280913881), (-1.839982245, 5.6235508988)],
                knots=[0, 0, 0, 1, 1, 1], degree=2))
            add(Edge.make_bspline(
                [(-1.839982245, 5.6235508988), (-1.1107877581, 6.3190104095), (0.2853212597, 6.3190104095)],
                knots=[0, 0, 0, 1, 1, 1], degree=2))
            add(Edge.make_bspline(
                [(0.2853212597, 6.3190104095), (1.6295303139, 6.3190104095), (2.3665097954, 5.6053859116)],
                knots=[0, 0, 0, 1, 1, 1], degree=2))
            add(Edge.make_bspline(
                [(2.3665097954, 5.6053859116), (3.1034892769, 4.8917614137), (3.1034892769, 3.5631223485)],
                knots=[0, 0, 0, 1, 1, 1], degree=2))
            add(Edge.make_bspline(
                [(3.1034892769, 3.5631223485), (3.1034892769, 2.2500532723), (2.3509398064, 1.5286437798)],
                knots=[0, 0, 0, 1, 1, 1], degree=2))
            add(Edge.make_bspline(
                [(2.3509398064, 1.5286437798), (1.5983903359, 0.8072342874), (0.2853212597, 0.8072342874)],
                knots=[0, 0, 0, 1, 1, 1], degree=2))
            add(Edge.make_bspline(
                [(0.2853212597, 0.8072342874), (-1.07964778, 0.8072342874), (-1.824412256, 1.5208587853)],
                knots=[0, 0, 0, 1, 1, 1], degree=2))
        make_face(mode=Mode.SUBTRACT)
    extrude(amount=F1_DEPTH)


solid = f1.part
